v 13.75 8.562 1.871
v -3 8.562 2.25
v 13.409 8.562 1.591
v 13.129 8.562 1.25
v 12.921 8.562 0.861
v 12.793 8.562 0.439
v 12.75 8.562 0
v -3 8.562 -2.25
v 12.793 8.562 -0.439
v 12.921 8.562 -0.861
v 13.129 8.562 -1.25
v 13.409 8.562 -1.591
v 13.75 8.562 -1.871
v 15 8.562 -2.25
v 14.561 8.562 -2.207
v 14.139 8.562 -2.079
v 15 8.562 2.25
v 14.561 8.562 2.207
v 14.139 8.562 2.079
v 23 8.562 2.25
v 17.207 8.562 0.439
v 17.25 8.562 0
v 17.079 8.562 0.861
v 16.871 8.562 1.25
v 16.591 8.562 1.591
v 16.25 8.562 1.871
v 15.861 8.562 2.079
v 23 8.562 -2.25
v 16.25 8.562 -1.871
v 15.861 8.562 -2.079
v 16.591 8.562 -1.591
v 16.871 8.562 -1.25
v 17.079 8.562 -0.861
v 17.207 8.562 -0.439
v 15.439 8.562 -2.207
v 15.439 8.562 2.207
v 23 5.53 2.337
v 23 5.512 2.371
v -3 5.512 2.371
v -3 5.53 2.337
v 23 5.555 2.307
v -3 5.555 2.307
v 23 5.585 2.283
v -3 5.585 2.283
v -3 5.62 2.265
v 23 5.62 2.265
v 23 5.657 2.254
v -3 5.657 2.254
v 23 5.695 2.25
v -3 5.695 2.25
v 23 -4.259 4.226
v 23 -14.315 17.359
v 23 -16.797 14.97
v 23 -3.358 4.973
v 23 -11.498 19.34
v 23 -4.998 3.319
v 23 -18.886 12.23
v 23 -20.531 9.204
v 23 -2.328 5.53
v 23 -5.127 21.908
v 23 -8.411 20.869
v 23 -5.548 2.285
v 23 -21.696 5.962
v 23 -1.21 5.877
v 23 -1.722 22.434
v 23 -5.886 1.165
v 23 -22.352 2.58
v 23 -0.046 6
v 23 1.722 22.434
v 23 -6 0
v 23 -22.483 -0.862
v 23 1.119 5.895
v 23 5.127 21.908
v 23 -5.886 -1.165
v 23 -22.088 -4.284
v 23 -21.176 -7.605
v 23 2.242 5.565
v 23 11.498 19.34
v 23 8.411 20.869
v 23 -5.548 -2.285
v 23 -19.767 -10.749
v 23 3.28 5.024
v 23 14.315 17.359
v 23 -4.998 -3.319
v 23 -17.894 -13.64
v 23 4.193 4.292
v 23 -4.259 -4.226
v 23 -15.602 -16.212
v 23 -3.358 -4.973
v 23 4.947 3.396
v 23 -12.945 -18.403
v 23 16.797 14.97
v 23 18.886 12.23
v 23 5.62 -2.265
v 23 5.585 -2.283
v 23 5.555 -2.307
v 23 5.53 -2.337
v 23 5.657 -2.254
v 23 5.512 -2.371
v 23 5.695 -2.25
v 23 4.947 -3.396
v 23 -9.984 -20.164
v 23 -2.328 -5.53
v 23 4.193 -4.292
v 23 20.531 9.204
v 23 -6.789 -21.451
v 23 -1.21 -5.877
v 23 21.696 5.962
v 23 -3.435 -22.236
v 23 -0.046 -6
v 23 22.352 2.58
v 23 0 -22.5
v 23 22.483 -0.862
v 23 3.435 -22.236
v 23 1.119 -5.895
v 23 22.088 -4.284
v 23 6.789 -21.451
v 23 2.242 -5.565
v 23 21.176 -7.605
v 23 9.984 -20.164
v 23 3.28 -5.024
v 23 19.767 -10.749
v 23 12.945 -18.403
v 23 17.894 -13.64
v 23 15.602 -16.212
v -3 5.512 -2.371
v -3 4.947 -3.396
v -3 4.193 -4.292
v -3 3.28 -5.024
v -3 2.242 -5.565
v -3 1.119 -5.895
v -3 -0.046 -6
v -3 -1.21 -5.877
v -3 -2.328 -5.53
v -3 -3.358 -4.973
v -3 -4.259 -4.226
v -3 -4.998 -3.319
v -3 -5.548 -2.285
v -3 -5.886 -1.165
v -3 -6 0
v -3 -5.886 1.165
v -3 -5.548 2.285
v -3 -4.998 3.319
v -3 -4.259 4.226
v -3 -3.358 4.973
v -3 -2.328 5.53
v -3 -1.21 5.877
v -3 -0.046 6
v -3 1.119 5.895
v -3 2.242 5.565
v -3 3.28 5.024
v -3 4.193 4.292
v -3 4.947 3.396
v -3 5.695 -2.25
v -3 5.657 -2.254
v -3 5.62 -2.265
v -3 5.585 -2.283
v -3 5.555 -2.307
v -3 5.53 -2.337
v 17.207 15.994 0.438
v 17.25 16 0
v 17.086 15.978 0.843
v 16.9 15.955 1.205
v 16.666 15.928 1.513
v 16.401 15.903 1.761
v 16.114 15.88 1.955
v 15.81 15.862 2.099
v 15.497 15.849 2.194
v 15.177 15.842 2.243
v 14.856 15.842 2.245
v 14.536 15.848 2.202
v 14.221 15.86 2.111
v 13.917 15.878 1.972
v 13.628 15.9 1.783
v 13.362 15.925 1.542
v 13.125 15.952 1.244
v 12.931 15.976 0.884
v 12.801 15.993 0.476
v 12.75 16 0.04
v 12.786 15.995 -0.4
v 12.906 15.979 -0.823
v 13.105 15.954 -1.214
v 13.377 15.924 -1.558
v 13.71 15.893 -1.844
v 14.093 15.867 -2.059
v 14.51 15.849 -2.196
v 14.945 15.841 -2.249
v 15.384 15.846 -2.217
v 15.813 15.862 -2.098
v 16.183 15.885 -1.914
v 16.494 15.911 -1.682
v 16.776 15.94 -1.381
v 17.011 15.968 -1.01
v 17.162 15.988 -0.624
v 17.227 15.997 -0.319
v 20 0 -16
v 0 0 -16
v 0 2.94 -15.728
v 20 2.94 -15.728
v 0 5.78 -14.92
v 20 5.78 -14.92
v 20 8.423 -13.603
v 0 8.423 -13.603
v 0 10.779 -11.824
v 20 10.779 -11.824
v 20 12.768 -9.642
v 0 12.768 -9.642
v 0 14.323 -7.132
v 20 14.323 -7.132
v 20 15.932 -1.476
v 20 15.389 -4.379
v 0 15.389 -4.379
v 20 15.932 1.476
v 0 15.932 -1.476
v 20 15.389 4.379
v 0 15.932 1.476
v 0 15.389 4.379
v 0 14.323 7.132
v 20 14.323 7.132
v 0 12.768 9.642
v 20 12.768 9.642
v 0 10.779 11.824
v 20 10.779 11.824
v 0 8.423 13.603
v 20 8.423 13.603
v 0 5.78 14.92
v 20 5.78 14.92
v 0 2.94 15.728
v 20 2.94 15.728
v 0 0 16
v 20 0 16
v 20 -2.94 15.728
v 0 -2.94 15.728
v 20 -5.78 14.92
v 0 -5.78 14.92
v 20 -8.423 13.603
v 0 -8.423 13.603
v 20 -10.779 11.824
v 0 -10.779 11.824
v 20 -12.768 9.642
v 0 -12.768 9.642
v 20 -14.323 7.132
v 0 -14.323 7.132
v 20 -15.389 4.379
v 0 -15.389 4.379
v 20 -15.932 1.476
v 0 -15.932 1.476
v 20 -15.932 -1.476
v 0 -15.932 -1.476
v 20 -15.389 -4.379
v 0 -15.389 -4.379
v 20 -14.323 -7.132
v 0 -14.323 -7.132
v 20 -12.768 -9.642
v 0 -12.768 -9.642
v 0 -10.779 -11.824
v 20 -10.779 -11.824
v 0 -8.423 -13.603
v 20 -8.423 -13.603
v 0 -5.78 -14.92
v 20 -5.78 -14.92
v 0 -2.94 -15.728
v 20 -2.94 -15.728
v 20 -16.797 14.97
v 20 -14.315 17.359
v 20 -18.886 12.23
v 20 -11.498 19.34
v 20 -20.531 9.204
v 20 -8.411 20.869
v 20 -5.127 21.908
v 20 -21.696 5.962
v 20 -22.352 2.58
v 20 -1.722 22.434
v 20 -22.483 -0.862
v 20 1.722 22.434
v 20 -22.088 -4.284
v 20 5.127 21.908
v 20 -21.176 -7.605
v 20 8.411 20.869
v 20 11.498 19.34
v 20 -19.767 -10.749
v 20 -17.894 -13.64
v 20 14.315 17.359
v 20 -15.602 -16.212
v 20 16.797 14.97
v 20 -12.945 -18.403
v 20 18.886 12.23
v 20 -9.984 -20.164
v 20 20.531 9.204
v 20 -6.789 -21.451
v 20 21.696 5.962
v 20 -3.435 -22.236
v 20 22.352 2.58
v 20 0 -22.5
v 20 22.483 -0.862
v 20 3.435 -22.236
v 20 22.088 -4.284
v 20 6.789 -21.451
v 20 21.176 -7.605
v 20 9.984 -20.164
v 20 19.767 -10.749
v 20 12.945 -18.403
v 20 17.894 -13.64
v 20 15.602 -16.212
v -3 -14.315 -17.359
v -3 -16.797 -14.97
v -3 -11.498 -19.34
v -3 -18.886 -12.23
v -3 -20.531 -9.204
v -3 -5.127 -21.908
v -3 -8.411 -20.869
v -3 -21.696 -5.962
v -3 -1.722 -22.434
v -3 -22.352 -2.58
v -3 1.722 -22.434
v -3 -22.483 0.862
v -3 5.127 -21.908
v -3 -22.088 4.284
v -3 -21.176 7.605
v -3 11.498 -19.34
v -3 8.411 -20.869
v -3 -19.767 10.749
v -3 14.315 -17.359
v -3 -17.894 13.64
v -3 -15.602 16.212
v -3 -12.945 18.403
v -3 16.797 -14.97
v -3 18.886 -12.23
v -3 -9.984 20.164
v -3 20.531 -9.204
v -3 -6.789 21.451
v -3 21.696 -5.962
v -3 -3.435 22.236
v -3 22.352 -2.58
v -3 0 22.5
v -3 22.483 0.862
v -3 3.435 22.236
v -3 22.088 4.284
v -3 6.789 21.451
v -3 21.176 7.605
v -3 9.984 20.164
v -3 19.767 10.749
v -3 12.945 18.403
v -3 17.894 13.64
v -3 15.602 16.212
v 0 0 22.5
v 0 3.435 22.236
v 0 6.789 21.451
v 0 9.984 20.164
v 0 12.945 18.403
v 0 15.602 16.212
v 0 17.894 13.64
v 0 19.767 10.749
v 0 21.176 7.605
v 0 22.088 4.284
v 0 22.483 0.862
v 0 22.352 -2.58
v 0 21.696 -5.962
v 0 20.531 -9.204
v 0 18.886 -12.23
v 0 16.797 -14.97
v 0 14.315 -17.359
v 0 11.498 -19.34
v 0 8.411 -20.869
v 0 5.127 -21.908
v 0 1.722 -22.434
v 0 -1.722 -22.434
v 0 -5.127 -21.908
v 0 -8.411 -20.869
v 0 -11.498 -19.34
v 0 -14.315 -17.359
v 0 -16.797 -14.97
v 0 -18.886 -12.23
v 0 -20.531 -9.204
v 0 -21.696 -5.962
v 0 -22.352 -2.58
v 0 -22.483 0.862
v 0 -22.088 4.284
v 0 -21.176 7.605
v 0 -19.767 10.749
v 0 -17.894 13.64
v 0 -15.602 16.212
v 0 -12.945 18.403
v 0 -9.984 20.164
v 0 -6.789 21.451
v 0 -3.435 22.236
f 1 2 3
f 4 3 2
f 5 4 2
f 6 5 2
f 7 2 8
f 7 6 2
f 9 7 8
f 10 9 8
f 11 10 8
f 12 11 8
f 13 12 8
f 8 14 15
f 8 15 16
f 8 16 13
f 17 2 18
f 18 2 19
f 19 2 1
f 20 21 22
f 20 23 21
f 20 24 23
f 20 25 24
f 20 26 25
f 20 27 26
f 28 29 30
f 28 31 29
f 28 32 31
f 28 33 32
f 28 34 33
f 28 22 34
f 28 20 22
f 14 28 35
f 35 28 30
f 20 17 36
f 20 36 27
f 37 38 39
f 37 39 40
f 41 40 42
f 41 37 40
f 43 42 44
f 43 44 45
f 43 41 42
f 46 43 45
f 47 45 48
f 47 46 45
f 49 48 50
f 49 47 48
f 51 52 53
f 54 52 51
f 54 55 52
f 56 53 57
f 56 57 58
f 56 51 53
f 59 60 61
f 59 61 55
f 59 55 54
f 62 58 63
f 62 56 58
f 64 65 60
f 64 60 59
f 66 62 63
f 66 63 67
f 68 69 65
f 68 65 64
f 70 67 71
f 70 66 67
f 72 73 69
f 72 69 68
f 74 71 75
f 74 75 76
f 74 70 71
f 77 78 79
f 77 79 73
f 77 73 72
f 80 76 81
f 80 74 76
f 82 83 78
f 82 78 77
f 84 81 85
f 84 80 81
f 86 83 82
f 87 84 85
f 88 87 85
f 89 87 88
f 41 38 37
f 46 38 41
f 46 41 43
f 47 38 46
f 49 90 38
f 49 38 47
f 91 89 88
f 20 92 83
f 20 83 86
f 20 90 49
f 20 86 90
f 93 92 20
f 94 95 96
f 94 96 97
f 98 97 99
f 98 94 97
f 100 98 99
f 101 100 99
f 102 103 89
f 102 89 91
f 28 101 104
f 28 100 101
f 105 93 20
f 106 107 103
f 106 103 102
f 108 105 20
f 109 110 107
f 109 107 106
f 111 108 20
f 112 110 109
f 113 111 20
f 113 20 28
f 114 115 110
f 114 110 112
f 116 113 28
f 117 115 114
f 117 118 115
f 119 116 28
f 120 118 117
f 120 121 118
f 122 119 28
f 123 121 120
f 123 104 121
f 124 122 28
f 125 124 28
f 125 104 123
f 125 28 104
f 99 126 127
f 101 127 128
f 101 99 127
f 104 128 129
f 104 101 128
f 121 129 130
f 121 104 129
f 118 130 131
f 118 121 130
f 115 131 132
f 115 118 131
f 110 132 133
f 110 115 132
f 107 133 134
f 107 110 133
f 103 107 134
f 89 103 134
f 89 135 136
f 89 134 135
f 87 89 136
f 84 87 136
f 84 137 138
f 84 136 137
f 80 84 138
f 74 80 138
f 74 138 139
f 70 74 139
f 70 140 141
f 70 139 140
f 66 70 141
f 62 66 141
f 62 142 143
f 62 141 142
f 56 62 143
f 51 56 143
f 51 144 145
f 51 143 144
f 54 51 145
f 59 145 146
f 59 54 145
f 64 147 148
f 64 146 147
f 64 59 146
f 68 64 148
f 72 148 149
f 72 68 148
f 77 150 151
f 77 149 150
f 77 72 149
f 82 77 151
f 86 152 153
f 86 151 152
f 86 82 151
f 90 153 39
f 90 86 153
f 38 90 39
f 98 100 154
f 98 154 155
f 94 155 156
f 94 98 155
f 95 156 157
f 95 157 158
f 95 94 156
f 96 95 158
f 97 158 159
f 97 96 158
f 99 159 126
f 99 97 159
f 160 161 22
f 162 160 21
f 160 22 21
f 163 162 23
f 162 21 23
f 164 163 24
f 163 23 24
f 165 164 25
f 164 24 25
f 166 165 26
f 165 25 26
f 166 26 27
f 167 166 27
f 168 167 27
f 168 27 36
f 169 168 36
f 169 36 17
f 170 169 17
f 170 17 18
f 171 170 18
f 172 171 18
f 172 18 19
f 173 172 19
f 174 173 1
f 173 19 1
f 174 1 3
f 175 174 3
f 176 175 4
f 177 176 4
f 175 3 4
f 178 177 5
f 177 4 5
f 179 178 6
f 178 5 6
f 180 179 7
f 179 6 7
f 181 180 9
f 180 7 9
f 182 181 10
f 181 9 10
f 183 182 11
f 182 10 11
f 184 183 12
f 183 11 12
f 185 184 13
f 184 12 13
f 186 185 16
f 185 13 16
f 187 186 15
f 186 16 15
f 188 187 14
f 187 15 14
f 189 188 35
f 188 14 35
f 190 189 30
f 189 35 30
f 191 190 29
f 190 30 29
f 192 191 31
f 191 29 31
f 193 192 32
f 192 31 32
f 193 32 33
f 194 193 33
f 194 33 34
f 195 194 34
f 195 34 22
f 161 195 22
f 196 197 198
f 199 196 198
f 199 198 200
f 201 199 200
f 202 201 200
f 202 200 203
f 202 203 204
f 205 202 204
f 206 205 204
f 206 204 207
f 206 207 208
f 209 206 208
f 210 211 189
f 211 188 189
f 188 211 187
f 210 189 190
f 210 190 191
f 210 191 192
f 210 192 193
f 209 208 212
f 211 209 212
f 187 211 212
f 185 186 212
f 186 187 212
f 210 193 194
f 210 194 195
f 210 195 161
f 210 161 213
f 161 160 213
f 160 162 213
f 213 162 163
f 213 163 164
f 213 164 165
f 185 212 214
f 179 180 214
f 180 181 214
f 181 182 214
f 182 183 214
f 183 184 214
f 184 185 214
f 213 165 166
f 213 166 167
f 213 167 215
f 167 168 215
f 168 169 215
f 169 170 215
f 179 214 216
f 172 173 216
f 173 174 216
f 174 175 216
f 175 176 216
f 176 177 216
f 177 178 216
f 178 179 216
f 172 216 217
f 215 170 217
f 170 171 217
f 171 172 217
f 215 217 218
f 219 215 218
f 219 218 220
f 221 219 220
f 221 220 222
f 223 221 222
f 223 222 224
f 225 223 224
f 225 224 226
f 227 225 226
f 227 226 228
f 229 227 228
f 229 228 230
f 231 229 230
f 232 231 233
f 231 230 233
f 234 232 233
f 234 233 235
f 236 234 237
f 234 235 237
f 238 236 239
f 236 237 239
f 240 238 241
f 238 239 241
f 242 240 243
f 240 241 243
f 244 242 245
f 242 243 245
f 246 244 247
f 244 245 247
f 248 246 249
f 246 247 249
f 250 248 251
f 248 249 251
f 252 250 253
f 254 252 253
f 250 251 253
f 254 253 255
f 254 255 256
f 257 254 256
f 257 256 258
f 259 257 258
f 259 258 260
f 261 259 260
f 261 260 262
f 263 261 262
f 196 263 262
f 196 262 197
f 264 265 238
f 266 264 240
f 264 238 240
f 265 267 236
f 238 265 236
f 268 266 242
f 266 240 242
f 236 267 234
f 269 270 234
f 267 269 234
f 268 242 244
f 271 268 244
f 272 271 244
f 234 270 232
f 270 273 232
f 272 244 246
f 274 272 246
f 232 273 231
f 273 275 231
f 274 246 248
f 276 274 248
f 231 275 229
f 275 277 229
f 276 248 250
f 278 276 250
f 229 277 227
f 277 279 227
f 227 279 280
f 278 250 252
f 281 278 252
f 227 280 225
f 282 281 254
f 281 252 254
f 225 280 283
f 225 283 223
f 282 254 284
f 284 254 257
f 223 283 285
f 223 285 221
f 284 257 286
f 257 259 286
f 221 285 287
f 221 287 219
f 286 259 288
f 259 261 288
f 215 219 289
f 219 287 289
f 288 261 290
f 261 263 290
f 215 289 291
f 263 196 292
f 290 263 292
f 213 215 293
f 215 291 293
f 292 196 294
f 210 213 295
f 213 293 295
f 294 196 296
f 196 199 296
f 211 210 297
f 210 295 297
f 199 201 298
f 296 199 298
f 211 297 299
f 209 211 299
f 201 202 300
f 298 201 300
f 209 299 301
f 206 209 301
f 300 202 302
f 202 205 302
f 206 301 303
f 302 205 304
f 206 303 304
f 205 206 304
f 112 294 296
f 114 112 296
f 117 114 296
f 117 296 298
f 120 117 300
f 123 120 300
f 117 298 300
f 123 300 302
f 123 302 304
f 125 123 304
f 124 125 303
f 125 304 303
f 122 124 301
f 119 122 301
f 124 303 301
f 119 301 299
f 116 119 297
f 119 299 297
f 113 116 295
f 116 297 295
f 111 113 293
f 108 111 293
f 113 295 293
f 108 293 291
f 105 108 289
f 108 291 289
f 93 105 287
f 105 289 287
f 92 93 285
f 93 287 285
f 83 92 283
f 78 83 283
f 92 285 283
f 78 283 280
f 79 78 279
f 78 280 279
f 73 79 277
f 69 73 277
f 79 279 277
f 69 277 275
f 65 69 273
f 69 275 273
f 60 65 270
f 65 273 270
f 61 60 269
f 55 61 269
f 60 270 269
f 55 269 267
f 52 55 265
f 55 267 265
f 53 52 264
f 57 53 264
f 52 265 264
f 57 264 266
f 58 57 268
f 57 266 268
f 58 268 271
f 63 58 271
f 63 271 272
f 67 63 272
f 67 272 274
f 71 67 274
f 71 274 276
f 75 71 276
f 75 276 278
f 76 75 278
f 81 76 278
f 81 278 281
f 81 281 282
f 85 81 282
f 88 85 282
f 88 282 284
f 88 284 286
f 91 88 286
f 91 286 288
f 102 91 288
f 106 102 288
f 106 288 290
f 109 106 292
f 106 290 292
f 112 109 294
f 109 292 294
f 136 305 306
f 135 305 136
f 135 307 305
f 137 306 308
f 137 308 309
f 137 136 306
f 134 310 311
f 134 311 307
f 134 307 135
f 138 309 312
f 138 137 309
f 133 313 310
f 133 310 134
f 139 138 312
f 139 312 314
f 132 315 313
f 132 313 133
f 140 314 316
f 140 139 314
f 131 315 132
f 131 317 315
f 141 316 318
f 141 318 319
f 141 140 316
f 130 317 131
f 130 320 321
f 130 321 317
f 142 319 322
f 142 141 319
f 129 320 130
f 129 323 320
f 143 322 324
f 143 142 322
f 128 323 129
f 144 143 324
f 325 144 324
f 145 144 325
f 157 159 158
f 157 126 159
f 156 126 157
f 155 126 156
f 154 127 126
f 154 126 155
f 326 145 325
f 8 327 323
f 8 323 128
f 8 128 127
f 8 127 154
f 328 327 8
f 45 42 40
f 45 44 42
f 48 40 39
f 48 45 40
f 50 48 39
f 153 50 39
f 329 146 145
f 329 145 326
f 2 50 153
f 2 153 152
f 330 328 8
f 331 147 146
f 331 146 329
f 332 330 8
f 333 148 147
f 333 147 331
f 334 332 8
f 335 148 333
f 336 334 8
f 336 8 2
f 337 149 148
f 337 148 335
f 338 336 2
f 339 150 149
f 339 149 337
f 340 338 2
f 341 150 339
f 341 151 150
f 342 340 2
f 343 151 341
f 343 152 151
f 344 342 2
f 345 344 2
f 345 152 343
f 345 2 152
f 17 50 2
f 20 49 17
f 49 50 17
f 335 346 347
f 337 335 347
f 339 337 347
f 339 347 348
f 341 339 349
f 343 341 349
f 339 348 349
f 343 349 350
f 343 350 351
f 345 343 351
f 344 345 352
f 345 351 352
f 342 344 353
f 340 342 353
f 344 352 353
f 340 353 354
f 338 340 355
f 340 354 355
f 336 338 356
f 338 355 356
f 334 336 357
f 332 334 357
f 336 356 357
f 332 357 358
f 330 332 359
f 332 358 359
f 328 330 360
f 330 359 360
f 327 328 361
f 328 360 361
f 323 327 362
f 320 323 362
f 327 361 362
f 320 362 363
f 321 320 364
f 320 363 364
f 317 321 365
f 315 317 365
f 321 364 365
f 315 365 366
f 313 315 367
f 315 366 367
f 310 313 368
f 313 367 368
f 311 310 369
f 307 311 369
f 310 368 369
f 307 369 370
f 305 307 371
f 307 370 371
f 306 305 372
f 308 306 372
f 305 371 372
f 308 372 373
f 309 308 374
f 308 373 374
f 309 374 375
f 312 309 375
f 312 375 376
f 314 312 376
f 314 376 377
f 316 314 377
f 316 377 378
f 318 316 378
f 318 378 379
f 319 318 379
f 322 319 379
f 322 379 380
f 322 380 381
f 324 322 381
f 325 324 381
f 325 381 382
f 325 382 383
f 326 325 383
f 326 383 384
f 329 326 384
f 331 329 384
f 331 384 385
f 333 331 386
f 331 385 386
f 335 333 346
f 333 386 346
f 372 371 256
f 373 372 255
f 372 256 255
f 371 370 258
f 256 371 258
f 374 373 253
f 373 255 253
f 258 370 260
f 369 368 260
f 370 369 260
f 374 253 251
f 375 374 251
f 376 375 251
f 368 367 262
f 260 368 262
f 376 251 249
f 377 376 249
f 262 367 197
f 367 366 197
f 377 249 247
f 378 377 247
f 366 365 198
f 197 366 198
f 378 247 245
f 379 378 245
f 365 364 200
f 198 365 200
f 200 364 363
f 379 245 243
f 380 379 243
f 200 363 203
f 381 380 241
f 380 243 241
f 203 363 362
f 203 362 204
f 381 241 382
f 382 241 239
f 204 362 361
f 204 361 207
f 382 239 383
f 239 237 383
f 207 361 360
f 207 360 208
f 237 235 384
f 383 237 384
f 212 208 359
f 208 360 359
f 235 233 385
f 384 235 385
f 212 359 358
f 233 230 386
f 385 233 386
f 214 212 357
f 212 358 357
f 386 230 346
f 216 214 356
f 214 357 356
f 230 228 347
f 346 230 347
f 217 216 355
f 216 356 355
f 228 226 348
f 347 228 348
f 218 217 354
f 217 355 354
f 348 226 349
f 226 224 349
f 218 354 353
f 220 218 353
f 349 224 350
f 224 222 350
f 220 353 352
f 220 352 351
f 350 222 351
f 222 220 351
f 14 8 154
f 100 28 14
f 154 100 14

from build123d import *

# Parameters (mm, degrees)
SKETCH1_R               = 16
BOSS_EXTRUDE1_DEPTH     = 20
SKETCH3_R               = 22.5
BOSS_EXTRUDE2_DEPTH     = 3
SKETCH4_R               = 22.5
BOSS_EXTRUDE3_DEPTH     = 3
CUT_EXTRUDE2_DEPTH      = 3
CUT_EXTRUDE2_DEPTH_BACK = 25
SKETCH6_R               = 2.25
CUT_EXTRUDE3_DEPTH      = 10


with BuildPart() as part:
    # Sketch1 → Boss-Extrude1 (new body)
    with BuildSketch(Plane(origin=(0, 0, 0), x_dir=(0, 0, -1), z_dir=(1, 0, 0))):
        Circle(SKETCH1_R)
    extrude(amount=BOSS_EXTRUDE1_DEPTH)

    # Sketch3 → Boss-Extrude2 (add)
    with BuildSketch(Plane(origin=(20, 0, 0), x_dir=(0, 0, -1), z_dir=(1, 0, 0))):
        Circle(SKETCH3_R)
    extrude(amount=BOSS_EXTRUDE2_DEPTH)

    # Sketch4 → Boss-Extrude3 (add)
    with BuildSketch(Plane.ZY):
        Circle(SKETCH4_R)
    extrude(amount=BOSS_EXTRUDE3_DEPTH)

    # Sketch2 → Cut-Extrude2 (cut, two sides)
    with BuildSketch(Plane(origin=(20, 0, 0), x_dir=(0, 0, -1), z_dir=(1, 0, 0))) as cut_extrude2_sk:
        with BuildLine():
            Line((-2.25, 8.562148865), (2.25, 8.562148865))
            Line((2.25, 8.562148865), (2.25, 5.695392875))
            ThreePointArc((2.25, 5.695392875), (2.282957413, 5.585407539), (2.370967742, 5.511670524))
            ThreePointArc((2.370967742, 5.511670524), (0, -6), (-2.370967742, 5.511670524))
            ThreePointArc((-2.370967742, 5.511670524), (-2.282957413, 5.585407539), (-2.25, 5.695392875))
            Line((-2.25, 5.695392875), (-2.25, 8.562148865))
        make_face()
    extrude(amount=CUT_EXTRUDE2_DEPTH, mode=Mode.SUBTRACT)
    extrude(cut_extrude2_sk.sketch, amount=-CUT_EXTRUDE2_DEPTH_BACK, mode=Mode.SUBTRACT)

    # Sketch6 → Cut-Extrude3 (cut)
    with BuildSketch(Plane.XZ.offset(-8.562148865)):
        with Locations((15, 0)):
            Circle(SKETCH6_R)
    extrude(amount=-CUT_EXTRUDE3_DEPTH, mode=Mode.SUBTRACT)


solid = part.part
